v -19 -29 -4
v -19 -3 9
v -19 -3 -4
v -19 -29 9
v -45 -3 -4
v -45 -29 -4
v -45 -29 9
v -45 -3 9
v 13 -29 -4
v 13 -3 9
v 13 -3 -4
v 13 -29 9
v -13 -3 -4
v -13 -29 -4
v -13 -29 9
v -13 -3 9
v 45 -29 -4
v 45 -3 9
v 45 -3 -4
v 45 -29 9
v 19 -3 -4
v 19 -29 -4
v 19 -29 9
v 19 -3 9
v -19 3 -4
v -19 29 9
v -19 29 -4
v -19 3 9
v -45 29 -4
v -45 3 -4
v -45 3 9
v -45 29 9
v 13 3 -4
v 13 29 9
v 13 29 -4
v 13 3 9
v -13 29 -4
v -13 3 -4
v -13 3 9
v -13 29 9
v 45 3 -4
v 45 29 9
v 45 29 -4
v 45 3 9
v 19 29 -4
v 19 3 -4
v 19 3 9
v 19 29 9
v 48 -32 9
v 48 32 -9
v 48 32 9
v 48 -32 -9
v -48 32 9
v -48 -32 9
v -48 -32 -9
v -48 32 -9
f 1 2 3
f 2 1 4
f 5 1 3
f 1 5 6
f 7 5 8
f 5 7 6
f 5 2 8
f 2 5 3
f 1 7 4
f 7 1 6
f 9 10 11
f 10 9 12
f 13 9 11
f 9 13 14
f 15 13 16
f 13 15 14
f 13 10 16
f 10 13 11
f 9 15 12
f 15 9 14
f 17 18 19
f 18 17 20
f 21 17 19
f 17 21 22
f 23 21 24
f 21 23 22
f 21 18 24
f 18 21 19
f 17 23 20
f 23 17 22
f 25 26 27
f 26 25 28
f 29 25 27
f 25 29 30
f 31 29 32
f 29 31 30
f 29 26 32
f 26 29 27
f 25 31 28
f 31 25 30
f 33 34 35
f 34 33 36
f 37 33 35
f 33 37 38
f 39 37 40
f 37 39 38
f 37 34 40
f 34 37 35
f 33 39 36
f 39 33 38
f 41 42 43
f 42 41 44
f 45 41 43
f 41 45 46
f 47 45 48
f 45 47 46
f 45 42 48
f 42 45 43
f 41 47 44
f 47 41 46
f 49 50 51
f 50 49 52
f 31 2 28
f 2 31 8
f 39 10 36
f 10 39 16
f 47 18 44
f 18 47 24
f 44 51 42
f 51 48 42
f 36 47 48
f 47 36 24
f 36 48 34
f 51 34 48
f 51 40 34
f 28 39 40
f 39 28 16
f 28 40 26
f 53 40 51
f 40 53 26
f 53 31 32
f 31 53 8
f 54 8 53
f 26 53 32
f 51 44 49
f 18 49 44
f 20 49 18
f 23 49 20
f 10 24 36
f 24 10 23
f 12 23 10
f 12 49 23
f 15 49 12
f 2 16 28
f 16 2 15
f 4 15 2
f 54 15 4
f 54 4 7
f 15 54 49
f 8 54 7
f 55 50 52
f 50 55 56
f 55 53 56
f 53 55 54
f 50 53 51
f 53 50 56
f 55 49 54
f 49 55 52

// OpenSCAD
$fn = 32;

// ----------------------------------------------------------------------
// Pocket plate 96 x 64 x 18
// 2 x 3 pockets 26 mm square, 13 mm deep
// ----------------------------------------------------------------------

// --- parameters (mm) ---
thickness = 18;  // plate thickness
floor_t = 5;     // material left under each pocket
pocket = 26;     // pocket side length
pitch_x = 32;    // pocket pitch along X
pitch_y = 32;    // pocket pitch along Y
cols = 3;        // pockets per row
rows = 2;        // rows of pockets

// --- derived feature positions (mm) ---
depth = thickness - floor_t;        // = 13   pocket depth, down to the floor
span_x = (cols - 1) * pitch_x;      // = 64   distance between outer pockets
span_y = (rows - 1) * pitch_y;      // = 32   distance between outer pocket rows
origin_x = -span_x / 2;             // = -32   X of the first pocket
origin_y = -span_y / 2;             // = -16   Y of the first pocket
plate = [span_x + pocket + 6, span_y + pocket + 6, thickness];  // = [96, 64, 18]   overall size: pockets plus 3 mm of wall on each side
feature_centers = [
  [origin_x + 0 * pitch_x, origin_y + 0 * pitch_y],
  [origin_x + 1 * pitch_x, origin_y + 0 * pitch_y],
  [origin_x + 2 * pitch_x, origin_y + 0 * pitch_y],
  [origin_x + 0 * pitch_x, origin_y + 1 * pitch_y],
  [origin_x + 1 * pitch_x, origin_y + 1 * pitch_y],
  [origin_x + 2 * pitch_x, origin_y + 1 * pitch_y]
];   // pocket centres, used verbatim by the cutter loop

// plate outline, then one pocket per centre in feature_centers
difference() {
  cube(plate, center = true);
  for (centre = feature_centers)
    translate([centre[0] - pocket / 2, centre[1] - pocket / 2, plate[2] / 2 - depth])
      cube([pocket, pocket, depth + 1]);  // centred on the declared pocket centre
}
